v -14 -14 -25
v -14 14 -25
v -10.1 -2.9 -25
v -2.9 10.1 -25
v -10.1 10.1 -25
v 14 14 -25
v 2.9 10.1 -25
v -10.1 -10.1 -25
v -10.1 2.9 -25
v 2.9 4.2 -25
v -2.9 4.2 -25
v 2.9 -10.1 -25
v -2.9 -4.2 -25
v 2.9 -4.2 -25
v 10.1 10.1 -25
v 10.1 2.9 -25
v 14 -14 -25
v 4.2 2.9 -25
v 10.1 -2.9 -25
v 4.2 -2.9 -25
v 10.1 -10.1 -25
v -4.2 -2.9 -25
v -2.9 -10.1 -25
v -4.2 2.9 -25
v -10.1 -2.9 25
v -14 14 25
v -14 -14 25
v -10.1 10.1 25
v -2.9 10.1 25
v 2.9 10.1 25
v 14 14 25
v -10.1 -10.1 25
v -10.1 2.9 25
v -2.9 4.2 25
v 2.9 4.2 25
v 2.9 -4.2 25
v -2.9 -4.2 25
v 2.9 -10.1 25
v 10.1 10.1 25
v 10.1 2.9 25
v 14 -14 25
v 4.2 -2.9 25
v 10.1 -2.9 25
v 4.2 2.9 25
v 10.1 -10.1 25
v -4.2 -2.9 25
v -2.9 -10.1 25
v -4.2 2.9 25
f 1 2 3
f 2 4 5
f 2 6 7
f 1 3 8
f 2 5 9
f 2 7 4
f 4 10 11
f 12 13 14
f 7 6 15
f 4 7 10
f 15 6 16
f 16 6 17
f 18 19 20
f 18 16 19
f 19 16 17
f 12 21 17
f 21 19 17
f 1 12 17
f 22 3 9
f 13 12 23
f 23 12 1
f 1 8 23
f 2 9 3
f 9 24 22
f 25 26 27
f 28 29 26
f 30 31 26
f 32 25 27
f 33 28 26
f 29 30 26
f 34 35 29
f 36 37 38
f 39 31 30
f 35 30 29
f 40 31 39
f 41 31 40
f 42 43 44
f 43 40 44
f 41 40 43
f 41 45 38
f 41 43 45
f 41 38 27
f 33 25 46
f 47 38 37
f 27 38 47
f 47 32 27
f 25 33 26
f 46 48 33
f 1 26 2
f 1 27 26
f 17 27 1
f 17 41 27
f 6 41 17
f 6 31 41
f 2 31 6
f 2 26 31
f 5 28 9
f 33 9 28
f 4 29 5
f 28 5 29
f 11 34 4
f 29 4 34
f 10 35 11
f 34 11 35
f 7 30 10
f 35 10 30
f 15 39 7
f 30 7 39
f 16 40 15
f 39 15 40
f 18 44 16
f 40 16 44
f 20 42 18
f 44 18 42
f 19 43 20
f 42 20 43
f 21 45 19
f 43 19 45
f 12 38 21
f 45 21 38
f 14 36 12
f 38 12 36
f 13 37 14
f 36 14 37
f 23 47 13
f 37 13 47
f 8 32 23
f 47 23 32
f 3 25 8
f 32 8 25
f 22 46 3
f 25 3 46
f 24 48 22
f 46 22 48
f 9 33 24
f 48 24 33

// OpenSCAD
module copy_mirror(vec){
    children();
    mirror(vec)
    children();
}

tolerance = .1;
outer_corner = 14;
inner_corner = 10 + tolerance;
nub_length = 6 - tolerance;
rail_thickness = .5;
gap_size = 3 - tolerance;
tube_length = 50;

silhouette_points = [[inner_corner,inner_corner],[inner_corner,gap_size],
                    [inner_corner - nub_length, gap_size],[inner_corner - nub_length, 0],
                    [outer_corner,0],[outer_corner,outer_corner]];
                linear_extrude(height = tube_length, center = true, convexity = 0, twist = 0){
                    copy_mirror([-1,1,0])
                        copy_mirror([1,1,0])
                            copy_mirror([1,0,0])
                                polygon(silhouette_points,10);
                }
render();
